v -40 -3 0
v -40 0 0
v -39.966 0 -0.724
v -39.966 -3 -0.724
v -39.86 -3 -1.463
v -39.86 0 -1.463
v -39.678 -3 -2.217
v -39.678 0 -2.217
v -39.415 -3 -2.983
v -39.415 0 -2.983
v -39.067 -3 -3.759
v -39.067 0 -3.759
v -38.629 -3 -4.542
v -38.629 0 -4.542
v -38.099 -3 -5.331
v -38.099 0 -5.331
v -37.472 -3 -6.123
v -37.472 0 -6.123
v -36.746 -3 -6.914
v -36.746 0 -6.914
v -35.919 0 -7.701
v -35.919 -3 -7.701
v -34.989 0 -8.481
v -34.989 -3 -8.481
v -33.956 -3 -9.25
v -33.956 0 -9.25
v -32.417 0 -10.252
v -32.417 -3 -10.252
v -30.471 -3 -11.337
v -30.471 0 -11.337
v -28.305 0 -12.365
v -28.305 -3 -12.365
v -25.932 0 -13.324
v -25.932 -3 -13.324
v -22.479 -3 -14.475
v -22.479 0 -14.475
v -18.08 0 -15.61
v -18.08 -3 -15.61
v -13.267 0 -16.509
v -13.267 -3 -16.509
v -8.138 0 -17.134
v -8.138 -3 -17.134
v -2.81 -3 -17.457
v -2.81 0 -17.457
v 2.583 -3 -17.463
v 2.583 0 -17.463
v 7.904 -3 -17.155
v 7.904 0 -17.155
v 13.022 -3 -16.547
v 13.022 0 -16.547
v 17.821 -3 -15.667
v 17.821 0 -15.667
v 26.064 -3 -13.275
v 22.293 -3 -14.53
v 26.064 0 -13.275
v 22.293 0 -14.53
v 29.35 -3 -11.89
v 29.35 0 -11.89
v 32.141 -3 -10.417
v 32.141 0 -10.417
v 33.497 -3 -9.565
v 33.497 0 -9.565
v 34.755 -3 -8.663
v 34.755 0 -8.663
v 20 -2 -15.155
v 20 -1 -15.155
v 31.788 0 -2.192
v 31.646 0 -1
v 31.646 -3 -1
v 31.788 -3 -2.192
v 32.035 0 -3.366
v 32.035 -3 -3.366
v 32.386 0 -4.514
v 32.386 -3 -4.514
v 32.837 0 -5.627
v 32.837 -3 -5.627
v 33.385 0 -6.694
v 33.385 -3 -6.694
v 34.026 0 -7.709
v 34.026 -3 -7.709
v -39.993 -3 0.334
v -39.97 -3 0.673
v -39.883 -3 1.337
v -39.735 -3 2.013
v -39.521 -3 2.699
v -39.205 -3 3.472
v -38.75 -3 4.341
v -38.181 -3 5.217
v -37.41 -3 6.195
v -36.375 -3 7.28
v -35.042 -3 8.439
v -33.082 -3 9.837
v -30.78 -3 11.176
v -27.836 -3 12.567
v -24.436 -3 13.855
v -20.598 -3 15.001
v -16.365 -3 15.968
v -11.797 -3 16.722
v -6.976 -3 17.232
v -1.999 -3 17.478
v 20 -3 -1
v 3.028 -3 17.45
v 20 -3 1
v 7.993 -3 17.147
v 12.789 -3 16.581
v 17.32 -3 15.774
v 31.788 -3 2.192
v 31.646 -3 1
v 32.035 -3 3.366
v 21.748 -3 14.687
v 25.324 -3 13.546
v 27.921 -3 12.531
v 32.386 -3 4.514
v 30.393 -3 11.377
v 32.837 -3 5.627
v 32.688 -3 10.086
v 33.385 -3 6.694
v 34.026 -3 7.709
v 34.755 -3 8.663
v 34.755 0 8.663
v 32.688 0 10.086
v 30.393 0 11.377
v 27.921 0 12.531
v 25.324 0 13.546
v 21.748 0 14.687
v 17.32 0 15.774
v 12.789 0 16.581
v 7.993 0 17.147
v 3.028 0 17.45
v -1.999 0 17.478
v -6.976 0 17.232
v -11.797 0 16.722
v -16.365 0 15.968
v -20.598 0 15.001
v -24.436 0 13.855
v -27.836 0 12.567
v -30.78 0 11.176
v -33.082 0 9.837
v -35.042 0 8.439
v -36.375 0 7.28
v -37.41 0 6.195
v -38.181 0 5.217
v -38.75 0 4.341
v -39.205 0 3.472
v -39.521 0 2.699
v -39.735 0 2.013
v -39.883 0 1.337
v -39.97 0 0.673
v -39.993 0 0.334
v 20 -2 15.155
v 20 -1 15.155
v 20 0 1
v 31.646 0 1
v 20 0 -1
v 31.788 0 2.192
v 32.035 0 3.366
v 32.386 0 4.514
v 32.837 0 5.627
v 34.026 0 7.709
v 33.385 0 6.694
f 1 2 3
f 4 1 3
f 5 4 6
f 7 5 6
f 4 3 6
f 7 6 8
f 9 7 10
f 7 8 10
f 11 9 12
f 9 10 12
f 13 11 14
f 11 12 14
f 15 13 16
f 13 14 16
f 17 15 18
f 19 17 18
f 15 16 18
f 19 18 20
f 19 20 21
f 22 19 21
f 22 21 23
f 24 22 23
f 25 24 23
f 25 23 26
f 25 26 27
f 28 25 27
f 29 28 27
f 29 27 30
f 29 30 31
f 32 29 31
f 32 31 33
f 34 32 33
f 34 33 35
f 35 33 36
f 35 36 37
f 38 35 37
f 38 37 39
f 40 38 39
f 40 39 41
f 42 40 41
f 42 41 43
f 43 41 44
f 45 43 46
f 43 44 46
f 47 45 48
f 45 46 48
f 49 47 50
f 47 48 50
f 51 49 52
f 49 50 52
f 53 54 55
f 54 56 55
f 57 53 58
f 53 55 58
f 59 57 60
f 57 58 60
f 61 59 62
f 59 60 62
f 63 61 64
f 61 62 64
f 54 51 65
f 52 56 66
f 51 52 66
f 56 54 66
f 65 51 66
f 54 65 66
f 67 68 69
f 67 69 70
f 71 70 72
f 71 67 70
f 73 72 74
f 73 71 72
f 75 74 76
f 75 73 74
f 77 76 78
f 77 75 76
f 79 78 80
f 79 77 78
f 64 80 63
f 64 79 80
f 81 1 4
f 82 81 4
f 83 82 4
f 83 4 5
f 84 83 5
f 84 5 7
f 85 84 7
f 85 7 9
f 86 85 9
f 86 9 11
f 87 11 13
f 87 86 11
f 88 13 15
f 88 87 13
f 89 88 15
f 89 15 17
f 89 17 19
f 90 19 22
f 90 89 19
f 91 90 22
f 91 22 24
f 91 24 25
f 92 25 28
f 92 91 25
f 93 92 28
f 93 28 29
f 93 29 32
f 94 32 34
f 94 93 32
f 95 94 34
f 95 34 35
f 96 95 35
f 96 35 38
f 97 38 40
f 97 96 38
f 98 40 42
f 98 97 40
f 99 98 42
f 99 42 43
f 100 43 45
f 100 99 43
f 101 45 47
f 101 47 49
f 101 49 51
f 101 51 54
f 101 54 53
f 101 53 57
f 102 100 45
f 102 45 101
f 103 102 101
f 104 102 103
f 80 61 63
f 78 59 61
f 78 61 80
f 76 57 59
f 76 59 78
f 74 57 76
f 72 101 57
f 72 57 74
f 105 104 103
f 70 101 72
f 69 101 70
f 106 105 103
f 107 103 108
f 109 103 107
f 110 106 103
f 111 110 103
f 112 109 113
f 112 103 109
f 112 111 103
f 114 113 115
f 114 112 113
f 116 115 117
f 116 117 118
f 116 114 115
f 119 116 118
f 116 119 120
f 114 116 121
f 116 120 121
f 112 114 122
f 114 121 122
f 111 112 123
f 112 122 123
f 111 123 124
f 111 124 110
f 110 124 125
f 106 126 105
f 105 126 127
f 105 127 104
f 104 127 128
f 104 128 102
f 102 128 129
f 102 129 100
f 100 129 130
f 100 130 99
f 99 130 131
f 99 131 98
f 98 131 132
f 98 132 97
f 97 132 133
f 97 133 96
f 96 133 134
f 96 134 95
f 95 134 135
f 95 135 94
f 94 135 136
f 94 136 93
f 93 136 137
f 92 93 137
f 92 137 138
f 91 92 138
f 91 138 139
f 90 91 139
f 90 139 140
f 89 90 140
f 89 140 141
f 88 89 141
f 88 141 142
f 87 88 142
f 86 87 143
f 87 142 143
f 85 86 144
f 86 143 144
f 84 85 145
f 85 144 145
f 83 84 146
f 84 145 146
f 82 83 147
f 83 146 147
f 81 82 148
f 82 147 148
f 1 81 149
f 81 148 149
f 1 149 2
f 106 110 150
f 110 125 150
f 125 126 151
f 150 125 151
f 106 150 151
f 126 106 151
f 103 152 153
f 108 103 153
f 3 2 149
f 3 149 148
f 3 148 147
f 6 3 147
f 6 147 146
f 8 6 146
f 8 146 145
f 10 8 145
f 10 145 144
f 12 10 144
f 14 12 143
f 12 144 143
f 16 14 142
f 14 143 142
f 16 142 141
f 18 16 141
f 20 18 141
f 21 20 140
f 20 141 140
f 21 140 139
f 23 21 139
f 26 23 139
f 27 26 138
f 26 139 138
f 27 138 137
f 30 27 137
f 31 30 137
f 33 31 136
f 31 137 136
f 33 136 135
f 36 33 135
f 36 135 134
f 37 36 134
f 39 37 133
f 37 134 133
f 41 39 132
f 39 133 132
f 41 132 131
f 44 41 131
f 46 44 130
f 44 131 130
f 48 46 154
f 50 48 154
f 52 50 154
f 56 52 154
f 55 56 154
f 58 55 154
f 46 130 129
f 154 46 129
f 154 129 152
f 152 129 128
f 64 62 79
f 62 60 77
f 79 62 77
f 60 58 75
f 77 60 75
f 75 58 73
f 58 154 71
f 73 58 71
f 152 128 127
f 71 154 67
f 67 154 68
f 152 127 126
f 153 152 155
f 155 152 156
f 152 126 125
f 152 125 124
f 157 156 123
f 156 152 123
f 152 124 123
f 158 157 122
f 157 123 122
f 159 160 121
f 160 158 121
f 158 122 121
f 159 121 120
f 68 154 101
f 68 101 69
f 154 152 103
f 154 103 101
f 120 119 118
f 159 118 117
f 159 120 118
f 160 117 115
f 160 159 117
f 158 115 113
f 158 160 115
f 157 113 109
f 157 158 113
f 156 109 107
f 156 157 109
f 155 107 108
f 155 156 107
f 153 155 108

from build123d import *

# Parameters (mm, degrees)
F1_DEPTH = 3
F2_R     = 13.5
F3_DEPTH = 25
F4_W     = 20
F4_H     = 1
F5_DEPTH = 25


with BuildPart() as f1:
    # F0 (on Front) → F1 (new body)
    with BuildSketch(Plane.XZ):
        with BuildLine():
            add(Edge.make_bspline(
                [(-40, 0), (-40, -30.3108891325), (20, -15.1554445662), (80, 0), (20, 15.1554445662), (-40, 30.3108891325), (-40, 0)],
                knots=[0, 0, 0, 2.0943951024, 2.0943951024, 4.1887902048, 4.1887902048, 6.2831853072, 6.2831853072, 6.2831853072], degree=2, weights=[1, 0.5, 1, 0.5, 1, 0.5, 1]))
        make_face()
    extrude(amount=F1_DEPTH)

    # F2 (on Front) → F3 (cut)
    with BuildSketch(Plane.XZ):
        with Locations((45.1087198094, 0)):
            Circle(F2_R)
    extrude(amount=F3_DEPTH, mode=Mode.SUBTRACT)

    # F4 (on Front) → F5 (cut)
    with BuildSketch(Plane.XZ):
        with Locations((30, 0.5)):
            Rectangle(F4_W, F4_H)
        with Locations((30, -0.5)):
            Rectangle(F4_W, F4_H)
    extrude(amount=F5_DEPTH, mode=Mode.SUBTRACT)


solid = f1.part
